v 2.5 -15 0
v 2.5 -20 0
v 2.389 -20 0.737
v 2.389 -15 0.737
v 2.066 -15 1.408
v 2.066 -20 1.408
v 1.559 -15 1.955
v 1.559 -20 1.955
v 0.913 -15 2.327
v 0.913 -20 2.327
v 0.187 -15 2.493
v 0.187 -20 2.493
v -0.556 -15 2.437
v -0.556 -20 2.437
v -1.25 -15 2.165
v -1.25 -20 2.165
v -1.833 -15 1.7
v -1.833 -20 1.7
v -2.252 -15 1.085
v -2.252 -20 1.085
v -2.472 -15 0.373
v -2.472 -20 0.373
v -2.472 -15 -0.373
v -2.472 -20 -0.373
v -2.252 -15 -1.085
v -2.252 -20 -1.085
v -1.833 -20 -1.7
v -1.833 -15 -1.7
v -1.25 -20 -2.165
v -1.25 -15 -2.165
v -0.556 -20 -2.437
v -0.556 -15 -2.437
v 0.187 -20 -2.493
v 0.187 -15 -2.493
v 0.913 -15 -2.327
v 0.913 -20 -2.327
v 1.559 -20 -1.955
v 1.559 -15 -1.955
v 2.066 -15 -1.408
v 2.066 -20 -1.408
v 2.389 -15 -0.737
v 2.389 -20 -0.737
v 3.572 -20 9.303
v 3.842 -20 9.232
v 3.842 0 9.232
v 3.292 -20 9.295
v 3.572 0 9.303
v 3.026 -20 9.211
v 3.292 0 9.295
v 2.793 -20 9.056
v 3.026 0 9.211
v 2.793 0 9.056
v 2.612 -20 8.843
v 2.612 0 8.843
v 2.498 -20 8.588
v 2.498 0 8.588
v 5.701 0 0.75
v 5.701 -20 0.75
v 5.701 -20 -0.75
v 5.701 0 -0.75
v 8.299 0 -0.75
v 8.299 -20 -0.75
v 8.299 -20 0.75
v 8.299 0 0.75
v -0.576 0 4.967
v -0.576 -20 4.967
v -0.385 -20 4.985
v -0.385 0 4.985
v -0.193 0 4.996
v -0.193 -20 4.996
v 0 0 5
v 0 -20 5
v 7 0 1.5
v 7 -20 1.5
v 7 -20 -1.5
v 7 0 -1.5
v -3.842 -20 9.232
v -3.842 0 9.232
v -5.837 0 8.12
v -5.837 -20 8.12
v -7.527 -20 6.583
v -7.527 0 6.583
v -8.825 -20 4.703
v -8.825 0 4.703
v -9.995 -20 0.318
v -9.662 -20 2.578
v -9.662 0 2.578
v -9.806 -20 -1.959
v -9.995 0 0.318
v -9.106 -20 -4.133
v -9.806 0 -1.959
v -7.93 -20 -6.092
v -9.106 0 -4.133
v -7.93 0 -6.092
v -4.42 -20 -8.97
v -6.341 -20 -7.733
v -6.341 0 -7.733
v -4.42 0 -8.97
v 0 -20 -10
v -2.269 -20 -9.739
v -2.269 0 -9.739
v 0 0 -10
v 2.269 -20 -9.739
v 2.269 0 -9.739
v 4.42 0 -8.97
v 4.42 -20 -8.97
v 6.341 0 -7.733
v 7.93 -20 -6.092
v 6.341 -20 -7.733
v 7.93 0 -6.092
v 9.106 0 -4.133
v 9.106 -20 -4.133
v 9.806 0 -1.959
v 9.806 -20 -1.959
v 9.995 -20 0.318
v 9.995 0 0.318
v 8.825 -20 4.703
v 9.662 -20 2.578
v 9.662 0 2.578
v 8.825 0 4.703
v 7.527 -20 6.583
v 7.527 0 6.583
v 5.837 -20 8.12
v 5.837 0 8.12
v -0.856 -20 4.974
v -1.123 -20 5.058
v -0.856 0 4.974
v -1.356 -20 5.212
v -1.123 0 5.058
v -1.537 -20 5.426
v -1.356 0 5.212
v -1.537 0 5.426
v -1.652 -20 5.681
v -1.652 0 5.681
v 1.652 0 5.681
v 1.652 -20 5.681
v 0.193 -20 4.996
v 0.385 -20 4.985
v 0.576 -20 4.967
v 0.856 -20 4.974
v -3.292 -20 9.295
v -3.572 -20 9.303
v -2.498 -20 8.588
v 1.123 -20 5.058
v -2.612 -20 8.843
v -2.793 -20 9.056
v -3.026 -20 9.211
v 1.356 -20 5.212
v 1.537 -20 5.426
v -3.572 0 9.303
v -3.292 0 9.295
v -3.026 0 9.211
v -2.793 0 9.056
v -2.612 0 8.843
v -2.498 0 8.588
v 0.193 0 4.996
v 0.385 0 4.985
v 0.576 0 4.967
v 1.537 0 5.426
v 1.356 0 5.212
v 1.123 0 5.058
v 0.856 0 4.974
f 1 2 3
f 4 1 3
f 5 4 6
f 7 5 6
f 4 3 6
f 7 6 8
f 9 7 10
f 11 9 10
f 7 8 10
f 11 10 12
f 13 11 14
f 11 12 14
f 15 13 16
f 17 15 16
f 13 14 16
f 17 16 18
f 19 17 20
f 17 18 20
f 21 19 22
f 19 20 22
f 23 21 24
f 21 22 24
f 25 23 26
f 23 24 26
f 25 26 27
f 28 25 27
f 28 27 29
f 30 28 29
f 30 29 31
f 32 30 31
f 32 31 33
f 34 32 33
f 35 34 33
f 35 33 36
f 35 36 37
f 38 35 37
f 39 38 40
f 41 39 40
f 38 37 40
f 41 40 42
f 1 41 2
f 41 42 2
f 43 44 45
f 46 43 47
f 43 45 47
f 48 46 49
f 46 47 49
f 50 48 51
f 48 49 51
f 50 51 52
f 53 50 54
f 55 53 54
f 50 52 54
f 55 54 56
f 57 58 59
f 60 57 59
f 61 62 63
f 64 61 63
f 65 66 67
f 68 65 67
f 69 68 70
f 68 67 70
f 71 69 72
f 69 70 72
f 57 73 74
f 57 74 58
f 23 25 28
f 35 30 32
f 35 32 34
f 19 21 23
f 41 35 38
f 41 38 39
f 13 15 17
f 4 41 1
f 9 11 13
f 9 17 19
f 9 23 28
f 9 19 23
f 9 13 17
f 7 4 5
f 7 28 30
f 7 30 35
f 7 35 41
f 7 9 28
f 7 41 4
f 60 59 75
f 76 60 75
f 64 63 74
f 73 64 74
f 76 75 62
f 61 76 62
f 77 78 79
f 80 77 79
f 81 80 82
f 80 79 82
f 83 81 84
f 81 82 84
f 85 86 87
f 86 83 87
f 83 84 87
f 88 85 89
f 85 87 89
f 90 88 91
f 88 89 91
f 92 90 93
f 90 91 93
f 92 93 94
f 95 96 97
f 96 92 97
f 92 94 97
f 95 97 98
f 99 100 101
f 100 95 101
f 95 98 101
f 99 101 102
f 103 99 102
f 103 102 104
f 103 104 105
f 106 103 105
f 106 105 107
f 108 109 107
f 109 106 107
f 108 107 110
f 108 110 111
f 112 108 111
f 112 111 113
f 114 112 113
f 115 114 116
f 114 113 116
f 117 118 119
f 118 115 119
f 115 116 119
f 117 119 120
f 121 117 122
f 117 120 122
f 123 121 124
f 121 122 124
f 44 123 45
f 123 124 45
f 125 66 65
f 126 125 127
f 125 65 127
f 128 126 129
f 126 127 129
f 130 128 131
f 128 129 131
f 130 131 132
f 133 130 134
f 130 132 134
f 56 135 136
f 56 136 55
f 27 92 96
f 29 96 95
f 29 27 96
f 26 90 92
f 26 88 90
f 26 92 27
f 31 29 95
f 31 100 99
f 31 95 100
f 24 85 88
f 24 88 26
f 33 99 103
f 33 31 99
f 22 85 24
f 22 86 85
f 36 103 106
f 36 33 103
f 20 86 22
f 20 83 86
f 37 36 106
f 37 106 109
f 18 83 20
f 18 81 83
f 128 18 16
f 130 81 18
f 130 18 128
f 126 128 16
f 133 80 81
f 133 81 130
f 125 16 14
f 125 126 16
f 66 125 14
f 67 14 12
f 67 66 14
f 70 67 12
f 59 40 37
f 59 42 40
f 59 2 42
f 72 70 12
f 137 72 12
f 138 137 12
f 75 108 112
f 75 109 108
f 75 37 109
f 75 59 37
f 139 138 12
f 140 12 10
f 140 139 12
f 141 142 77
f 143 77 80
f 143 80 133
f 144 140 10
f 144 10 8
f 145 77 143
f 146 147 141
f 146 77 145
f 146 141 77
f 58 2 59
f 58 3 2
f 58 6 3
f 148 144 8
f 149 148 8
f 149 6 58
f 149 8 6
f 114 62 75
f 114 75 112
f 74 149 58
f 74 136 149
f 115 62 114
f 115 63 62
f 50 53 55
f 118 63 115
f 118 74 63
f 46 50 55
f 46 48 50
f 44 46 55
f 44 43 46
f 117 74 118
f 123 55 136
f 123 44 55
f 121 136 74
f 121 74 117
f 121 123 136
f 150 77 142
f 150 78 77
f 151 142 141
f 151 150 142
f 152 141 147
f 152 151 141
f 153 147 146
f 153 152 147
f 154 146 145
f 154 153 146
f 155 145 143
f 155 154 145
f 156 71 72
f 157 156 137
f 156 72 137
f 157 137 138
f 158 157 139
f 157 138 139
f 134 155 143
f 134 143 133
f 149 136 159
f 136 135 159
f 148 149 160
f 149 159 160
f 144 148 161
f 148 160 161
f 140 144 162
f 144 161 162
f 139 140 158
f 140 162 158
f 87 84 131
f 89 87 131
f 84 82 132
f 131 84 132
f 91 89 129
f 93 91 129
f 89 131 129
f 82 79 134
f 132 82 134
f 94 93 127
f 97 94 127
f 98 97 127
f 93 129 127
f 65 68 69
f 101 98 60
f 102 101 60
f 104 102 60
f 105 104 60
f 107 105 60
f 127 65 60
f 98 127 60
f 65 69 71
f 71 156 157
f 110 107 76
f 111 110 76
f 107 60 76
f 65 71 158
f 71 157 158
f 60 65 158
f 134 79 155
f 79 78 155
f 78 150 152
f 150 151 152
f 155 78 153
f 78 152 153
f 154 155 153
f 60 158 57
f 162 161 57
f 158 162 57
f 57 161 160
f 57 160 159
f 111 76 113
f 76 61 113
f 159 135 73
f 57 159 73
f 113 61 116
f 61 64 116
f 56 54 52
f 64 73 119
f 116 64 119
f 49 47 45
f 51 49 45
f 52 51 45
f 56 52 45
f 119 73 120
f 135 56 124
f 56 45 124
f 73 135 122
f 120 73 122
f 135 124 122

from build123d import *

# Parameters (mm, degrees)
F0_R      = 10
F1_DEPTH  = 20
F2_R      = 2.5
F3_DEPTH  = 5
F13_DEPTH = 20.001
F4_R      = 1
F6_DEPTH  = 20.001
F9_R      = 5.3210242514
F10_DEPTH = 25


# Not quite as in the source:
# - the program builds the solid bodies; features that only make, move or delete a surface that nothing else refers to are left out


with BuildPart() as f1:
    # F0 (on Front) → F1 (new body)
    with BuildSketch(Plane.XZ):
        Circle(F0_R)
    extrude(amount=F1_DEPTH)

    # F2 (on face) → F3 (cut)
    with BuildSketch(Plane.XZ.offset(20)):
        Circle(F2_R)
    extrude(amount=-F3_DEPTH, mode=Mode.SUBTRACT)

    # F12 (on face) → F13 (cut, through all)
    with BuildSketch(Plane.XZ.offset(20)):
        with BuildLine():
            ThreePointArc((2.7924241272, 9.6022063868), (1.4103077913, 9.9000521177), (0, 10))
            Line((0, 10), (0, 5))
            ThreePointArc((0, 5), (0.7051538957, 4.9500260589), (1.3962120636, 4.8011031934))
            Line((1.3962120636, 4.8011031934), (2.7924241272, 9.6022063868))
        make_face()
        with BuildLine():
            Line((0, 5), (0, 10))
            ThreePointArc((0, 10), (-1.4103077913, 9.9000521177), (-2.7924241272, 9.6022063868))
            Line((-2.7924241272, 9.6022063868), (-1.3962120636, 4.8011031934))
            ThreePointArc((-1.3962120636, 4.8011031934), (-0.7051538957, 4.9500260589), (0, 5))
        make_face()
    extrude(amount=-F13_DEPTH, mode=Mode.SUBTRACT)

    # F4
    f4_edges = [f1.edges().sort_by_distance(p)[0] for p in [
        (-2.792424, -10, 9.602206),
        (2.792424, -10, 9.602206),
        (-1.396212, -10, 4.801103),
        (1.396212, -10, 4.801103),
    ]]
    fillet(f4_edges, radius=F4_R)

    # F5 (on face) → F6 (cut, through all)
    with BuildSketch(Plane.XZ.offset(20)):
        Polygon((8.2990381057, 0.75), (7, 1.5), (5.7009618943, 0.75), (5.7009618943, -0.75), (7, -1.5), (8.2990381057, -0.75), align=None)
    extrude(amount=-F6_DEPTH, mode=Mode.SUBTRACT)

    # F9 (on face) → F10 (cut)
    with BuildSketch(Plane(origin=(0, 0, 0), x_dir=(-1, 0, 0), z_dir=(0, 1, 0))):
        with Locations((11.770372279, -20.3817021102)):
            Circle(F9_R)
    extrude(amount=-F10_DEPTH, mode=Mode.SUBTRACT)


solid = f1.part
